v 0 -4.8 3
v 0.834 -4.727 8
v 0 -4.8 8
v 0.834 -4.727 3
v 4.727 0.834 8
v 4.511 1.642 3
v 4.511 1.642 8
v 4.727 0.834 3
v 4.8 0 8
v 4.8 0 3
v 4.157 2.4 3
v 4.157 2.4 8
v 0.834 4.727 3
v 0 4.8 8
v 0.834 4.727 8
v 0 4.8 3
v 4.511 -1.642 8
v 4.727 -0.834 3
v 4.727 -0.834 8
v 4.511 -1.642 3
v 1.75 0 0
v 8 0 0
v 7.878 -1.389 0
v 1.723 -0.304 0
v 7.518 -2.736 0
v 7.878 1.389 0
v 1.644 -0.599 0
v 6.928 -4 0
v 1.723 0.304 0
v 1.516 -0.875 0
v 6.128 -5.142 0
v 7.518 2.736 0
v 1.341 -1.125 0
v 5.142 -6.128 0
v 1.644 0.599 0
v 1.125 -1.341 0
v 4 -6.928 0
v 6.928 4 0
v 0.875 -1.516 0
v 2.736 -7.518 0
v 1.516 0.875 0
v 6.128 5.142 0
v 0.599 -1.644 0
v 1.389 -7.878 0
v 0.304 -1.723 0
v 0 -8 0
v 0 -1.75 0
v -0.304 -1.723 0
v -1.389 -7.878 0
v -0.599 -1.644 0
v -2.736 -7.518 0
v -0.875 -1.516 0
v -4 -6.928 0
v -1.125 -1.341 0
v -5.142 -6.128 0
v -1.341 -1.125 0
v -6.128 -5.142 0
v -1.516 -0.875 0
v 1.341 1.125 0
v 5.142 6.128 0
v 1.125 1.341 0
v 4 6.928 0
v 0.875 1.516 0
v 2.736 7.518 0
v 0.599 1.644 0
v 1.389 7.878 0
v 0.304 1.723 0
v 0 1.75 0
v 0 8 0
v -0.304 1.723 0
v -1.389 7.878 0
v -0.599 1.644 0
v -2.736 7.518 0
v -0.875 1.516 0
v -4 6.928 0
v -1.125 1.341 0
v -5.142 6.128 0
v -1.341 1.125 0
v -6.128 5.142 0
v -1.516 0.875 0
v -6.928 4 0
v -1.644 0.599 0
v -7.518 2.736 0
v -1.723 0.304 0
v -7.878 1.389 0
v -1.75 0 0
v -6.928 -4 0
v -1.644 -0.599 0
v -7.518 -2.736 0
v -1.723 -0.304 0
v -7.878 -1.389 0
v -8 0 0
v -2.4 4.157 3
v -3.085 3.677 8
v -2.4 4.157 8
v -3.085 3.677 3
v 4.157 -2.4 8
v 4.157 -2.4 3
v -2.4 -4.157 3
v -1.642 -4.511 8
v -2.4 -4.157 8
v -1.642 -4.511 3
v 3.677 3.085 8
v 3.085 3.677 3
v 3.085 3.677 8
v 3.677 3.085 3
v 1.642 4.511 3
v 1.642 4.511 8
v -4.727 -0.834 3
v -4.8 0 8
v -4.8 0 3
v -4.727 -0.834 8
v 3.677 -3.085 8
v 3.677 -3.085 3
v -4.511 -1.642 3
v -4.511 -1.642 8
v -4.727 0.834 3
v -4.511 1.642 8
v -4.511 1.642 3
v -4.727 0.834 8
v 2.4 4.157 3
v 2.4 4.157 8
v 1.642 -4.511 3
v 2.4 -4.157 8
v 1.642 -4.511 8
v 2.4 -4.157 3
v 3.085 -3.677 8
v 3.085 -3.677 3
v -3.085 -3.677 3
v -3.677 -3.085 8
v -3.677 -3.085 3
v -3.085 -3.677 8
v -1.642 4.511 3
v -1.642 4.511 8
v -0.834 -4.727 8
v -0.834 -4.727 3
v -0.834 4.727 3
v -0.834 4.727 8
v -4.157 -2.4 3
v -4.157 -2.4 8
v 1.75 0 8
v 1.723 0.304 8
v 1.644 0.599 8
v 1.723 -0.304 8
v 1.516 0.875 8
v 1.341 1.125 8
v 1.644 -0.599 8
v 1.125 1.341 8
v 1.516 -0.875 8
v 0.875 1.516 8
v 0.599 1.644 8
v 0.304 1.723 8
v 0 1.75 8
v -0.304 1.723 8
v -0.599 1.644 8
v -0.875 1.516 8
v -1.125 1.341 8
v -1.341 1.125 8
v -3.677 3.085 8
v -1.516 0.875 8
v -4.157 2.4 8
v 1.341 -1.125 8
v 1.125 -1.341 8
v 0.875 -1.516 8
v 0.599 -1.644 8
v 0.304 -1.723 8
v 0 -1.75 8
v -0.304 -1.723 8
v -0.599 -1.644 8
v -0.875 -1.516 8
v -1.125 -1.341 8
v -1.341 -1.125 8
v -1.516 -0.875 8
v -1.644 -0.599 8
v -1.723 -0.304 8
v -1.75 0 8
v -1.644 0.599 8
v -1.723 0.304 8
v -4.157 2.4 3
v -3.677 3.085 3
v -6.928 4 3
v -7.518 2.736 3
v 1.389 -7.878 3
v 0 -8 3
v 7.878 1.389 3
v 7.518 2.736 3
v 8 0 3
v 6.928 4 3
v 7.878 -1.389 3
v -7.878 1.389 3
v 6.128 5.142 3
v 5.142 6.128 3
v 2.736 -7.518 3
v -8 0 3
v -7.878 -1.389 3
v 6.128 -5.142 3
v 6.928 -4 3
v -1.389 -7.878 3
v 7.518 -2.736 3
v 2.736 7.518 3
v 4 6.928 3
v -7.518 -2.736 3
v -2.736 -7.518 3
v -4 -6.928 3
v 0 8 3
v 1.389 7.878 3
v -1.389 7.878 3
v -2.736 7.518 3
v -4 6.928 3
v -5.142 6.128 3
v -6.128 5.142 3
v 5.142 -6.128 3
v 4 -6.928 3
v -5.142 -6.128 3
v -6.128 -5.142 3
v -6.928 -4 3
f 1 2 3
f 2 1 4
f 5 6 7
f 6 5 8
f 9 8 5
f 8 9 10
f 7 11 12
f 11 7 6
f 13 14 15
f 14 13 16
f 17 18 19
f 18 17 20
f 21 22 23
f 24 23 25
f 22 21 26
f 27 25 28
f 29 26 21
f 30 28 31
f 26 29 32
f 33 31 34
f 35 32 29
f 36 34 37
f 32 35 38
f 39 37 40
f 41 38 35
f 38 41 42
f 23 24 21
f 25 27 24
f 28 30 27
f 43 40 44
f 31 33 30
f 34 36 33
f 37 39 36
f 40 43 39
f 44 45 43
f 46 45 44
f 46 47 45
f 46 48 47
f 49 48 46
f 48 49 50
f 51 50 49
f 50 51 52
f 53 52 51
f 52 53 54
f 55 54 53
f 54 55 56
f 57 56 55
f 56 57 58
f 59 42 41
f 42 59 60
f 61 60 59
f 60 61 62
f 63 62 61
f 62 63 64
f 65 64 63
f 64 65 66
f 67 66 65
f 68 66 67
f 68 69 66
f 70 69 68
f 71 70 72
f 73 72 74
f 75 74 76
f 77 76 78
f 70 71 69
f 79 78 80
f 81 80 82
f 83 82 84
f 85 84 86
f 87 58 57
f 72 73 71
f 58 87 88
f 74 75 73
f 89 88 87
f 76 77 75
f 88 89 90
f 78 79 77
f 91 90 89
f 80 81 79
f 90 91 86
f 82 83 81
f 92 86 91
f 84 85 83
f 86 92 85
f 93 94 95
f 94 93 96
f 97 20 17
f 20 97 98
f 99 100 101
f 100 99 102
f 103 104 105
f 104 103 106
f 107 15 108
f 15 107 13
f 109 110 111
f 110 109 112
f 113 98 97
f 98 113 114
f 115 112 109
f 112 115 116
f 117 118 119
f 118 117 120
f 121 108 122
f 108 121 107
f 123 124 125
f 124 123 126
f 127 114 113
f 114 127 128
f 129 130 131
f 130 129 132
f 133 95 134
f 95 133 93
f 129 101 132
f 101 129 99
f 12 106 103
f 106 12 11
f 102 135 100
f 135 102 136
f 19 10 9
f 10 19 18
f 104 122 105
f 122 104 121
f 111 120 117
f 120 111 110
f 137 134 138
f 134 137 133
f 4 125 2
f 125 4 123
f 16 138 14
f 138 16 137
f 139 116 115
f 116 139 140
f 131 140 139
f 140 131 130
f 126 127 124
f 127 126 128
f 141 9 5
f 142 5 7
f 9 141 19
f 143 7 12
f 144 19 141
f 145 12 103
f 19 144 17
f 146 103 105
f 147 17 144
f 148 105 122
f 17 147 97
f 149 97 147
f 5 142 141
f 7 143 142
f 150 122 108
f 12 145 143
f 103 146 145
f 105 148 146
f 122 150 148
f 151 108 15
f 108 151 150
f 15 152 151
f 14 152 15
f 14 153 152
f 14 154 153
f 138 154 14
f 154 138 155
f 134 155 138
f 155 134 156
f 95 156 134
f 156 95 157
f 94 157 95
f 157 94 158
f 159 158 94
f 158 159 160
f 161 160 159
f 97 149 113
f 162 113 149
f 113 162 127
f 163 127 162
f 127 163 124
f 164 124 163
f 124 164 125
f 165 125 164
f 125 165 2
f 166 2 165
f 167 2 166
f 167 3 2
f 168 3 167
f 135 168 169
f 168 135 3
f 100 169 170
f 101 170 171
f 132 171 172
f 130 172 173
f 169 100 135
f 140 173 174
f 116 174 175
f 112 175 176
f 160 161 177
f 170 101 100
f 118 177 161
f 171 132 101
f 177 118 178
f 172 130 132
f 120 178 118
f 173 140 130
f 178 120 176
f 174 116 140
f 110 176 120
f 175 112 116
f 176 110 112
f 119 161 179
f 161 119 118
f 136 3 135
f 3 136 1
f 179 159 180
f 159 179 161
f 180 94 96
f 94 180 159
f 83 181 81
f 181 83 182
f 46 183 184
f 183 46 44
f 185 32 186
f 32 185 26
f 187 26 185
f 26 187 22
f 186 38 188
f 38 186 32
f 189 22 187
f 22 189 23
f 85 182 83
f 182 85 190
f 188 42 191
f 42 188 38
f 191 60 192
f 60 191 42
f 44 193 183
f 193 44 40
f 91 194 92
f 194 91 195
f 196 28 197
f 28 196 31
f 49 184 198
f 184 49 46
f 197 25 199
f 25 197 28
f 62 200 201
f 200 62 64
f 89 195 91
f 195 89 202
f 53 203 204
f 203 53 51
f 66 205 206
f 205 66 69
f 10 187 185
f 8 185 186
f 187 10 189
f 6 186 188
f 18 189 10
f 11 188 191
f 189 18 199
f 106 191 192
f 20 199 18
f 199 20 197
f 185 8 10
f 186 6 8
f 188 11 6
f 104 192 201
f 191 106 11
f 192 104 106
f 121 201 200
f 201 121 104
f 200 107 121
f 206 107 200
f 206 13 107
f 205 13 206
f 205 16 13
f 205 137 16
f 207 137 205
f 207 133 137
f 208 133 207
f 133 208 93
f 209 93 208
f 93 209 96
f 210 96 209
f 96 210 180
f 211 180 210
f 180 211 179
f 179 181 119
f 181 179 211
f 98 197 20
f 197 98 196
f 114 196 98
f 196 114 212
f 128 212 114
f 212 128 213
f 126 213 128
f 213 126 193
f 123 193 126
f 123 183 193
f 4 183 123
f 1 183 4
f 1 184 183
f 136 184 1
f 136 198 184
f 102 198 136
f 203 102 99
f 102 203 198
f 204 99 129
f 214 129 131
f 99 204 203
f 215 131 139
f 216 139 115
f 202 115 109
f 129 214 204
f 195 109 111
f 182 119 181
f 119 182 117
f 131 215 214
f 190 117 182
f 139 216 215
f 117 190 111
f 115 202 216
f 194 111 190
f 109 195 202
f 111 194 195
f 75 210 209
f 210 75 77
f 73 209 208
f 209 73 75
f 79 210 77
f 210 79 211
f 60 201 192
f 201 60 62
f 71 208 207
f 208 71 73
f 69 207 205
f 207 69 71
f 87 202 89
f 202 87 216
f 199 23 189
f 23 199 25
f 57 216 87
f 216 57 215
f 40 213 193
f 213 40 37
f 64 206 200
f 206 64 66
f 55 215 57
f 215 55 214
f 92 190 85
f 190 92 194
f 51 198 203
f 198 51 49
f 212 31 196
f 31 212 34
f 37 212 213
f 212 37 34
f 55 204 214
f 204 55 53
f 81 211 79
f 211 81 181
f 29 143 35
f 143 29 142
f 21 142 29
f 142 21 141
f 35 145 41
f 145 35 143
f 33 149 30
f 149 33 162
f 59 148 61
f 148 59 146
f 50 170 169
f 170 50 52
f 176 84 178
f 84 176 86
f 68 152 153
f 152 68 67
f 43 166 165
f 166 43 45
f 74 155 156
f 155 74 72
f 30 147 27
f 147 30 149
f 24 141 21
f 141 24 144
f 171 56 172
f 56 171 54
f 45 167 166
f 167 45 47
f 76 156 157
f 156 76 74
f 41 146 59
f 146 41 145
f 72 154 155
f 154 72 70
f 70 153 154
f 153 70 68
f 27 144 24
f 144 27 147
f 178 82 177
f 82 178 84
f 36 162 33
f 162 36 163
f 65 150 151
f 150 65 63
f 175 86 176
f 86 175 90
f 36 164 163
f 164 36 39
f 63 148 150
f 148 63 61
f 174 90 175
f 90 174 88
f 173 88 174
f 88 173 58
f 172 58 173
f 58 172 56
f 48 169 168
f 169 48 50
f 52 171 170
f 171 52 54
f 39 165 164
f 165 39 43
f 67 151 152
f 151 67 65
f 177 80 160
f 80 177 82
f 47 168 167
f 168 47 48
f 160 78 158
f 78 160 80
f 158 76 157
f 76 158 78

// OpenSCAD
postDia = 9.6;
postHeight = 8;
shoulderDia = 16;
shoulderHeight = 3;
holeDia = 3.5;

difference() {
union() {
	cylinder($fn=36,r=postDia/2,h=postHeight);
	cylinder($fn=36,r=shoulderDia/2,h=shoulderHeight);
	//translate([-27,-17,0])
		//cube([54,34,2]);
}

cylinder($fn=36,r=holeDia/2,h=15);
}
